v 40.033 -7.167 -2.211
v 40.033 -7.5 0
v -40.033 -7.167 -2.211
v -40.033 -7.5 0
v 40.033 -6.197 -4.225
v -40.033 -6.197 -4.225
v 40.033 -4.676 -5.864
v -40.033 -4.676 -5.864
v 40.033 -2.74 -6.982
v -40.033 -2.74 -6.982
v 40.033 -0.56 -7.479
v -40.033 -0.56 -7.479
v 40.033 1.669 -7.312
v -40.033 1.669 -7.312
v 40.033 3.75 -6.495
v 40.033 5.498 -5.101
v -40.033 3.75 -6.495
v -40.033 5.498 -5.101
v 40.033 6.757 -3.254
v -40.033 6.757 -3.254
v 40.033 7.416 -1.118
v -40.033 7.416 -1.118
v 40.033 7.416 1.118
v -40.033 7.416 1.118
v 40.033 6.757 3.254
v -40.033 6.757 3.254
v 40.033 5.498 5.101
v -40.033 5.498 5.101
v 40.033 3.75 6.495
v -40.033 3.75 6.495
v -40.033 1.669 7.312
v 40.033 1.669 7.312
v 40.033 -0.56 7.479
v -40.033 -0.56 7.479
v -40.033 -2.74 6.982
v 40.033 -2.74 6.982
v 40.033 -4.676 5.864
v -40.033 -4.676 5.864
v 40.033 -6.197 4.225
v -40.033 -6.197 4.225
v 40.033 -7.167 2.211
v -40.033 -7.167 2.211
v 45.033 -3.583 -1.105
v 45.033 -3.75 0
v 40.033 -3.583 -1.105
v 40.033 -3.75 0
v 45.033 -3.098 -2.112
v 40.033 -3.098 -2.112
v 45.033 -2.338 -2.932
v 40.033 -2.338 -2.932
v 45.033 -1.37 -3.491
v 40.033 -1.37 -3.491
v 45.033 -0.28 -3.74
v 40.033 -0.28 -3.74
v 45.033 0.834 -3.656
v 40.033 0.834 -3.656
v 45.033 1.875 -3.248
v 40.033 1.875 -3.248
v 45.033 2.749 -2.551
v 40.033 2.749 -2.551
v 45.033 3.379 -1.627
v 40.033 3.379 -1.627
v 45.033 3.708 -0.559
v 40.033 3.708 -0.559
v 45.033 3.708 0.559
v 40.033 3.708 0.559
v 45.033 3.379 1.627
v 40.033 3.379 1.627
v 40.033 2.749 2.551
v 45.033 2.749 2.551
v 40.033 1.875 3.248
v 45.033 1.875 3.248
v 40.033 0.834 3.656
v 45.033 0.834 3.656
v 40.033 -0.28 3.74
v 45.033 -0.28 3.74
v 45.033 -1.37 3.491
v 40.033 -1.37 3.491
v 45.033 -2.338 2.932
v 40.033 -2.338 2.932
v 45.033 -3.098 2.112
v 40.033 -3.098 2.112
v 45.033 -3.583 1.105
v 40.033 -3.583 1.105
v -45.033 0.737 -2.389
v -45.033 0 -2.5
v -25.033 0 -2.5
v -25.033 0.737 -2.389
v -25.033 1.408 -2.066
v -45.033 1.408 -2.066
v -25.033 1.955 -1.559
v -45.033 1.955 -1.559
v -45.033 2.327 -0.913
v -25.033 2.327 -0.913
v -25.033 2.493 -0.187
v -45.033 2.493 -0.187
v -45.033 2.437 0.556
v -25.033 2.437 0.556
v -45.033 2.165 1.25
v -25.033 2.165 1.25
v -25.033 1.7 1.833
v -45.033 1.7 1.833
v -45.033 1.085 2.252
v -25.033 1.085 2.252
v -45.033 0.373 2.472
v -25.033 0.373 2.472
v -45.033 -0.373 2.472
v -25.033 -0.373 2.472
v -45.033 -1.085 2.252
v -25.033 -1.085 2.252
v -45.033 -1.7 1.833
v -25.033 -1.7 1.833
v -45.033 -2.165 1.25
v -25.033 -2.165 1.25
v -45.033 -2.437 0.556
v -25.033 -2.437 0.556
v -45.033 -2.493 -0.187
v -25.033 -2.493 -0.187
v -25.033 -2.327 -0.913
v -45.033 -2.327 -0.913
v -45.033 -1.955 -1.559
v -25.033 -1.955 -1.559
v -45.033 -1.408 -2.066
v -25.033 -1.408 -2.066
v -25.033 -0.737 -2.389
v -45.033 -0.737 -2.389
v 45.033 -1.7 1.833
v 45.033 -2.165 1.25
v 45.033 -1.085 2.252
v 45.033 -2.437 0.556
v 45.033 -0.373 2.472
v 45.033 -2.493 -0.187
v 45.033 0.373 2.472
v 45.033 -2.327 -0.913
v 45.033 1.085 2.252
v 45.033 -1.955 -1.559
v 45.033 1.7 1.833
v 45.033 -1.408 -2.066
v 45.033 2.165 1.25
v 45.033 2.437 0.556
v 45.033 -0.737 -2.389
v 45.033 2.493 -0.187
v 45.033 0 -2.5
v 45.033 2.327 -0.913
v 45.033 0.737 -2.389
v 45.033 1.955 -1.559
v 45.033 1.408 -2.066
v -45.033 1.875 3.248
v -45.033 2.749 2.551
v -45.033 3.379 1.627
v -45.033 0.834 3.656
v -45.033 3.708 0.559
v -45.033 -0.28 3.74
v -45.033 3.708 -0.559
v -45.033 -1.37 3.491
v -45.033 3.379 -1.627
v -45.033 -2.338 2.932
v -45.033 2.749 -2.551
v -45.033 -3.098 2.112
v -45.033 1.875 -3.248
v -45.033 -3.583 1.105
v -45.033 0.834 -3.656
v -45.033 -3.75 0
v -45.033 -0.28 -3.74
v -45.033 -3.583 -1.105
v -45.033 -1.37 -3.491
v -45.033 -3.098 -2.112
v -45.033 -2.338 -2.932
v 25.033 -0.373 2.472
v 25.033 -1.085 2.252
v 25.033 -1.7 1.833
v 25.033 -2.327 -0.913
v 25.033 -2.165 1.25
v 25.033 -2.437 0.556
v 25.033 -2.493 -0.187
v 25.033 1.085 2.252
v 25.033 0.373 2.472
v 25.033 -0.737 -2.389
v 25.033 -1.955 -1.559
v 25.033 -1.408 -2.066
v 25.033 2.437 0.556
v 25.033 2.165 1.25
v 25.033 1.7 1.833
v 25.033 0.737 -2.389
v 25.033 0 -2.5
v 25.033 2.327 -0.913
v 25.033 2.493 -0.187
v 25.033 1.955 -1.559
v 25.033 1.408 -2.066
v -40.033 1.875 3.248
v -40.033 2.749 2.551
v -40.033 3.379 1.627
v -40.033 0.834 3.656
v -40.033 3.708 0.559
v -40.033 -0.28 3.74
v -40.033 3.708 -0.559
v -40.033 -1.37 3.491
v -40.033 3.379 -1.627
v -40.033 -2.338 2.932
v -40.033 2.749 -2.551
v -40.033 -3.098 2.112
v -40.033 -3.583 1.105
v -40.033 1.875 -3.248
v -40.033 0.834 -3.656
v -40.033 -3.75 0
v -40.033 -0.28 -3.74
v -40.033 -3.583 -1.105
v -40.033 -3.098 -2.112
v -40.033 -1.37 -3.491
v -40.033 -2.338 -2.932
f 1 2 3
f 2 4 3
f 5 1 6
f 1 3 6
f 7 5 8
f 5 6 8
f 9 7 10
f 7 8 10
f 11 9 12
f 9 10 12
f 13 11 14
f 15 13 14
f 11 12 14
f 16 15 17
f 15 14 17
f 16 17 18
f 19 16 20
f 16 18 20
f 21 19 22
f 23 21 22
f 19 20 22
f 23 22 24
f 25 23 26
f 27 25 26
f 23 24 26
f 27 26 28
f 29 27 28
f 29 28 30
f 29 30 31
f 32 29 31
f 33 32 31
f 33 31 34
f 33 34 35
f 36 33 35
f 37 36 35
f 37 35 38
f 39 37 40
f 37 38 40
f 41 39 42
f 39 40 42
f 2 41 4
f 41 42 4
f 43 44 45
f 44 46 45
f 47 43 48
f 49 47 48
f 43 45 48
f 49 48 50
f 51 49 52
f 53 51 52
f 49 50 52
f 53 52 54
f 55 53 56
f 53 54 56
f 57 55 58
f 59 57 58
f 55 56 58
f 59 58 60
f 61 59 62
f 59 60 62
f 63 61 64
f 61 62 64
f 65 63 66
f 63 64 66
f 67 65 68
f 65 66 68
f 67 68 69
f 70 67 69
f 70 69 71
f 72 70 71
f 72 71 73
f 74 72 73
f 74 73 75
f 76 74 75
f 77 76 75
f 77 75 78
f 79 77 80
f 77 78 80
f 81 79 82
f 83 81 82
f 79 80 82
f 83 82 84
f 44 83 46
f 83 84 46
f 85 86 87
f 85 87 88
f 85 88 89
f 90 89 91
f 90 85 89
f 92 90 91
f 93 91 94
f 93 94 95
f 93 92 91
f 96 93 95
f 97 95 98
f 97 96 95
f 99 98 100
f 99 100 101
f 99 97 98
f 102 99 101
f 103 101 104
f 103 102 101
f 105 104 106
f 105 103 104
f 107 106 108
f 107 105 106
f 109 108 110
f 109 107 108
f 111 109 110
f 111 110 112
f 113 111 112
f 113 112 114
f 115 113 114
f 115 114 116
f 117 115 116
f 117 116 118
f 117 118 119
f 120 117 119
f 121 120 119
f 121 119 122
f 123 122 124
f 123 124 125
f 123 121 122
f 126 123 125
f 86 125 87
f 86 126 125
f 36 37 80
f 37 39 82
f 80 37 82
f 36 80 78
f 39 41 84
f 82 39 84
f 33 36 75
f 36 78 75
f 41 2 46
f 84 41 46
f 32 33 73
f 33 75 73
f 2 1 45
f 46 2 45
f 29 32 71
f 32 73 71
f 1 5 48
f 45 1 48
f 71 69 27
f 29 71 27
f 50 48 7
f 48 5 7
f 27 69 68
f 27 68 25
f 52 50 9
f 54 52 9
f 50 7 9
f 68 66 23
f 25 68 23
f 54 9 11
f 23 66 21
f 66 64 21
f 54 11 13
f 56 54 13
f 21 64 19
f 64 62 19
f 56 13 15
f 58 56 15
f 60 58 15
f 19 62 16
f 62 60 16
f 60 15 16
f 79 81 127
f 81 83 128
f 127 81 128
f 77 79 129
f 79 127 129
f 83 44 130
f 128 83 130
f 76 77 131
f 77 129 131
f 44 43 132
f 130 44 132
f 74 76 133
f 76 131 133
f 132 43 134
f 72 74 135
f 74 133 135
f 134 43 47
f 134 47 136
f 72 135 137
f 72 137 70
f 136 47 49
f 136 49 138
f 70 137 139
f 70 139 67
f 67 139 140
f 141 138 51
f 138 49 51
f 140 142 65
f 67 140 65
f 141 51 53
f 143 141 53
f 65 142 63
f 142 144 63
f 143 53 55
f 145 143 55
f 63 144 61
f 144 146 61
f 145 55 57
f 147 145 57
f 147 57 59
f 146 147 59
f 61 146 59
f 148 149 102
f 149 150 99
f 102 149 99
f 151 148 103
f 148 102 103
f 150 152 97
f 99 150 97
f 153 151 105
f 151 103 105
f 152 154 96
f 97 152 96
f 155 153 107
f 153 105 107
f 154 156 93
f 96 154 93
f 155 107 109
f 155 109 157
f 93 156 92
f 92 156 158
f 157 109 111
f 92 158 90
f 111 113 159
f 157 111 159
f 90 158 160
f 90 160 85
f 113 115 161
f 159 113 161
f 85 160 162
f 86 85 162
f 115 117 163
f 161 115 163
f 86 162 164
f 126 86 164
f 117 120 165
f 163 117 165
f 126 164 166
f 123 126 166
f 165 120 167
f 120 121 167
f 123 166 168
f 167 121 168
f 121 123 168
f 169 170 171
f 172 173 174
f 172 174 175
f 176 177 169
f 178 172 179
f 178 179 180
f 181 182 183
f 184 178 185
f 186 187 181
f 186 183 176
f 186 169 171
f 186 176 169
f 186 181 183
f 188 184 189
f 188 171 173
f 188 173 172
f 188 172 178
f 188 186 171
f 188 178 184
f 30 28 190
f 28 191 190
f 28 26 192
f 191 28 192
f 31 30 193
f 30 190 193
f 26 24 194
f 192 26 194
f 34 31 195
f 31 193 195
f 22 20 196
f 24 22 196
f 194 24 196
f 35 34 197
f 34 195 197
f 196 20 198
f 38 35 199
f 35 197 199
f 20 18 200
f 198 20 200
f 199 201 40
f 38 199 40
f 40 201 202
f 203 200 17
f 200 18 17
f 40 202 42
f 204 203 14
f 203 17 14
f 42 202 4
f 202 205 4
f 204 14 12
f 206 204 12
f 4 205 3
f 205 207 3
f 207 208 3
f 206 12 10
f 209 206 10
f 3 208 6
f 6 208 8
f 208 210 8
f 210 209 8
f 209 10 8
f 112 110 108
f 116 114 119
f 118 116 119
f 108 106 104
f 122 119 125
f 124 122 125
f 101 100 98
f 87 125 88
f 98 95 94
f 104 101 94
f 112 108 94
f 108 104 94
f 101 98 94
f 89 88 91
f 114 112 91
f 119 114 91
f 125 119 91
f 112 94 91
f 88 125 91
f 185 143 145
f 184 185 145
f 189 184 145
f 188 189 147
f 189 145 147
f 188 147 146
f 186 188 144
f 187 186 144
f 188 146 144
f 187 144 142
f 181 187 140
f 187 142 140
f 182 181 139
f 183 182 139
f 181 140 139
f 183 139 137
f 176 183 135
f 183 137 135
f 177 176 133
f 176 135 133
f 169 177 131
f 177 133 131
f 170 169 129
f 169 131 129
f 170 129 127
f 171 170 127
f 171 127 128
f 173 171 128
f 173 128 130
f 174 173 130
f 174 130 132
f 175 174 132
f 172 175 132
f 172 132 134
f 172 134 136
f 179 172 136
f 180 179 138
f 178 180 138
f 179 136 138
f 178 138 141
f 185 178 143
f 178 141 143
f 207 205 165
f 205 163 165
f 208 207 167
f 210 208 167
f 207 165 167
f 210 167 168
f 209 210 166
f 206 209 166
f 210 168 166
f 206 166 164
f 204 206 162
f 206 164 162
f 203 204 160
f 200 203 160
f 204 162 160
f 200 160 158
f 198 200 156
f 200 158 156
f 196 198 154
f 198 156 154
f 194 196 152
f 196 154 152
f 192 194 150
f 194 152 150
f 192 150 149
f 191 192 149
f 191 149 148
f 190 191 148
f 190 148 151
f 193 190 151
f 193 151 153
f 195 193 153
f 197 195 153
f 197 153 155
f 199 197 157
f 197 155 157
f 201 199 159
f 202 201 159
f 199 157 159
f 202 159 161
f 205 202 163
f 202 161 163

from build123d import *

# Parameters (mm, degrees)
SKETCH2_R          = 2.5
CUT_EXTRUDE1_DEPTH = 20


with BuildPart() as part:
    # Sketch1 → Revolve1 (revolve)
    with BuildSketch(Plane.XY, mode=Mode.PRIVATE) as revolve1_sk:
        Polygon((-45.033, 0), (45.033, 0), (45.033, 3.75), (40.033, 3.75), (40.033, 7.5), (-40.033, 7.5), (-40.033, 3.75), (-45.033, 3.75), align=None)
    revolve(revolve1_sk.sketch.rotate(Axis((-45.033, 0, 0), (1, 0, 0)), 180), axis=Axis((-45.033, 0, 0), (1, 0, 0)))

    # Sketch2 → Cut-Extrude1 (cut)
    with BuildSketch(Plane(origin=(45.033, 0, 0), x_dir=(0, 0, -1), z_dir=(1, 0, 0))):
        Circle(SKETCH2_R)
    cut_extrude1 = extrude(amount=-CUT_EXTRUDE1_DEPTH, mode=Mode.SUBTRACT)

    # Mirror1: Cut-Extrude1 across plane
    add(cut_extrude1.mirror(Plane(origin=(0, 0, 0), x_dir=(0, 0, 1), z_dir=(1, 0, 0))), mode=Mode.SUBTRACT)


solid = part.part
